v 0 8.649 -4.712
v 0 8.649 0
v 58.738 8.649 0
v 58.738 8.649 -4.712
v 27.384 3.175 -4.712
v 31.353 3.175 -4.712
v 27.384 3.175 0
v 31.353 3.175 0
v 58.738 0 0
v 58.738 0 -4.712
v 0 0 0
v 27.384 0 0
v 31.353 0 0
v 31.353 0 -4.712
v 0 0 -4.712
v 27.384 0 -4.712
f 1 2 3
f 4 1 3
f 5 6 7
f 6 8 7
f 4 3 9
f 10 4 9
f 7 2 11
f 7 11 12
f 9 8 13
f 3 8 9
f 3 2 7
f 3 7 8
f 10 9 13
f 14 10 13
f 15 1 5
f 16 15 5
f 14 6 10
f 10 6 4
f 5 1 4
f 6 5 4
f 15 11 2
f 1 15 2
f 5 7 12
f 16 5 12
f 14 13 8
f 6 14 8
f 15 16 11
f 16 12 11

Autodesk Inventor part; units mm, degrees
ref_plane "YZ Plane" through (0, 0, 0) normal (1, 0, 0) x (0, 1, 0)
ref_plane "XZ Plane" through (0, 0, 0) normal (0, 1, 0) x (-1, 0, 0)
ref_plane "XY Plane" through (0, 0, 0) normal (0, 0, 1) x (1, 0, 0)
sketch "Sketch1" plane through (0, 0, 0) normal (0, 0, 1) x (1, 0, 0)
  line L0 (0, 0) -> (0, 8.6487)
  line L1 (0, 8.6487) -> (58.7375, 8.6487)
  line L2 (58.7375, 8.6487) -> (58.7375, 0)
  line L3 (58.7375, 0) -> (31.3531, 0)
  line L4 (31.3531, 0) -> (31.3531, 3.175)
  line L5 (31.3531, 3.175) -> (27.3844, 3.175)
  line L6 (27.3844, 3.175) -> (27.3844, 0)
  line L7 (27.3844, 0) -> (0, 0)
  dimension "d0" = 3.9688
  dimension "d1" = 3.175
  dimension "d2" = 58.7375
  dimension "d3" = 8.6487
extrude "Extrusion1" add sketch "Sketch1" against normal blind 4.7117
properties part number "VS-009 (SLIDE KEY)" material "Steel, Carbon"
